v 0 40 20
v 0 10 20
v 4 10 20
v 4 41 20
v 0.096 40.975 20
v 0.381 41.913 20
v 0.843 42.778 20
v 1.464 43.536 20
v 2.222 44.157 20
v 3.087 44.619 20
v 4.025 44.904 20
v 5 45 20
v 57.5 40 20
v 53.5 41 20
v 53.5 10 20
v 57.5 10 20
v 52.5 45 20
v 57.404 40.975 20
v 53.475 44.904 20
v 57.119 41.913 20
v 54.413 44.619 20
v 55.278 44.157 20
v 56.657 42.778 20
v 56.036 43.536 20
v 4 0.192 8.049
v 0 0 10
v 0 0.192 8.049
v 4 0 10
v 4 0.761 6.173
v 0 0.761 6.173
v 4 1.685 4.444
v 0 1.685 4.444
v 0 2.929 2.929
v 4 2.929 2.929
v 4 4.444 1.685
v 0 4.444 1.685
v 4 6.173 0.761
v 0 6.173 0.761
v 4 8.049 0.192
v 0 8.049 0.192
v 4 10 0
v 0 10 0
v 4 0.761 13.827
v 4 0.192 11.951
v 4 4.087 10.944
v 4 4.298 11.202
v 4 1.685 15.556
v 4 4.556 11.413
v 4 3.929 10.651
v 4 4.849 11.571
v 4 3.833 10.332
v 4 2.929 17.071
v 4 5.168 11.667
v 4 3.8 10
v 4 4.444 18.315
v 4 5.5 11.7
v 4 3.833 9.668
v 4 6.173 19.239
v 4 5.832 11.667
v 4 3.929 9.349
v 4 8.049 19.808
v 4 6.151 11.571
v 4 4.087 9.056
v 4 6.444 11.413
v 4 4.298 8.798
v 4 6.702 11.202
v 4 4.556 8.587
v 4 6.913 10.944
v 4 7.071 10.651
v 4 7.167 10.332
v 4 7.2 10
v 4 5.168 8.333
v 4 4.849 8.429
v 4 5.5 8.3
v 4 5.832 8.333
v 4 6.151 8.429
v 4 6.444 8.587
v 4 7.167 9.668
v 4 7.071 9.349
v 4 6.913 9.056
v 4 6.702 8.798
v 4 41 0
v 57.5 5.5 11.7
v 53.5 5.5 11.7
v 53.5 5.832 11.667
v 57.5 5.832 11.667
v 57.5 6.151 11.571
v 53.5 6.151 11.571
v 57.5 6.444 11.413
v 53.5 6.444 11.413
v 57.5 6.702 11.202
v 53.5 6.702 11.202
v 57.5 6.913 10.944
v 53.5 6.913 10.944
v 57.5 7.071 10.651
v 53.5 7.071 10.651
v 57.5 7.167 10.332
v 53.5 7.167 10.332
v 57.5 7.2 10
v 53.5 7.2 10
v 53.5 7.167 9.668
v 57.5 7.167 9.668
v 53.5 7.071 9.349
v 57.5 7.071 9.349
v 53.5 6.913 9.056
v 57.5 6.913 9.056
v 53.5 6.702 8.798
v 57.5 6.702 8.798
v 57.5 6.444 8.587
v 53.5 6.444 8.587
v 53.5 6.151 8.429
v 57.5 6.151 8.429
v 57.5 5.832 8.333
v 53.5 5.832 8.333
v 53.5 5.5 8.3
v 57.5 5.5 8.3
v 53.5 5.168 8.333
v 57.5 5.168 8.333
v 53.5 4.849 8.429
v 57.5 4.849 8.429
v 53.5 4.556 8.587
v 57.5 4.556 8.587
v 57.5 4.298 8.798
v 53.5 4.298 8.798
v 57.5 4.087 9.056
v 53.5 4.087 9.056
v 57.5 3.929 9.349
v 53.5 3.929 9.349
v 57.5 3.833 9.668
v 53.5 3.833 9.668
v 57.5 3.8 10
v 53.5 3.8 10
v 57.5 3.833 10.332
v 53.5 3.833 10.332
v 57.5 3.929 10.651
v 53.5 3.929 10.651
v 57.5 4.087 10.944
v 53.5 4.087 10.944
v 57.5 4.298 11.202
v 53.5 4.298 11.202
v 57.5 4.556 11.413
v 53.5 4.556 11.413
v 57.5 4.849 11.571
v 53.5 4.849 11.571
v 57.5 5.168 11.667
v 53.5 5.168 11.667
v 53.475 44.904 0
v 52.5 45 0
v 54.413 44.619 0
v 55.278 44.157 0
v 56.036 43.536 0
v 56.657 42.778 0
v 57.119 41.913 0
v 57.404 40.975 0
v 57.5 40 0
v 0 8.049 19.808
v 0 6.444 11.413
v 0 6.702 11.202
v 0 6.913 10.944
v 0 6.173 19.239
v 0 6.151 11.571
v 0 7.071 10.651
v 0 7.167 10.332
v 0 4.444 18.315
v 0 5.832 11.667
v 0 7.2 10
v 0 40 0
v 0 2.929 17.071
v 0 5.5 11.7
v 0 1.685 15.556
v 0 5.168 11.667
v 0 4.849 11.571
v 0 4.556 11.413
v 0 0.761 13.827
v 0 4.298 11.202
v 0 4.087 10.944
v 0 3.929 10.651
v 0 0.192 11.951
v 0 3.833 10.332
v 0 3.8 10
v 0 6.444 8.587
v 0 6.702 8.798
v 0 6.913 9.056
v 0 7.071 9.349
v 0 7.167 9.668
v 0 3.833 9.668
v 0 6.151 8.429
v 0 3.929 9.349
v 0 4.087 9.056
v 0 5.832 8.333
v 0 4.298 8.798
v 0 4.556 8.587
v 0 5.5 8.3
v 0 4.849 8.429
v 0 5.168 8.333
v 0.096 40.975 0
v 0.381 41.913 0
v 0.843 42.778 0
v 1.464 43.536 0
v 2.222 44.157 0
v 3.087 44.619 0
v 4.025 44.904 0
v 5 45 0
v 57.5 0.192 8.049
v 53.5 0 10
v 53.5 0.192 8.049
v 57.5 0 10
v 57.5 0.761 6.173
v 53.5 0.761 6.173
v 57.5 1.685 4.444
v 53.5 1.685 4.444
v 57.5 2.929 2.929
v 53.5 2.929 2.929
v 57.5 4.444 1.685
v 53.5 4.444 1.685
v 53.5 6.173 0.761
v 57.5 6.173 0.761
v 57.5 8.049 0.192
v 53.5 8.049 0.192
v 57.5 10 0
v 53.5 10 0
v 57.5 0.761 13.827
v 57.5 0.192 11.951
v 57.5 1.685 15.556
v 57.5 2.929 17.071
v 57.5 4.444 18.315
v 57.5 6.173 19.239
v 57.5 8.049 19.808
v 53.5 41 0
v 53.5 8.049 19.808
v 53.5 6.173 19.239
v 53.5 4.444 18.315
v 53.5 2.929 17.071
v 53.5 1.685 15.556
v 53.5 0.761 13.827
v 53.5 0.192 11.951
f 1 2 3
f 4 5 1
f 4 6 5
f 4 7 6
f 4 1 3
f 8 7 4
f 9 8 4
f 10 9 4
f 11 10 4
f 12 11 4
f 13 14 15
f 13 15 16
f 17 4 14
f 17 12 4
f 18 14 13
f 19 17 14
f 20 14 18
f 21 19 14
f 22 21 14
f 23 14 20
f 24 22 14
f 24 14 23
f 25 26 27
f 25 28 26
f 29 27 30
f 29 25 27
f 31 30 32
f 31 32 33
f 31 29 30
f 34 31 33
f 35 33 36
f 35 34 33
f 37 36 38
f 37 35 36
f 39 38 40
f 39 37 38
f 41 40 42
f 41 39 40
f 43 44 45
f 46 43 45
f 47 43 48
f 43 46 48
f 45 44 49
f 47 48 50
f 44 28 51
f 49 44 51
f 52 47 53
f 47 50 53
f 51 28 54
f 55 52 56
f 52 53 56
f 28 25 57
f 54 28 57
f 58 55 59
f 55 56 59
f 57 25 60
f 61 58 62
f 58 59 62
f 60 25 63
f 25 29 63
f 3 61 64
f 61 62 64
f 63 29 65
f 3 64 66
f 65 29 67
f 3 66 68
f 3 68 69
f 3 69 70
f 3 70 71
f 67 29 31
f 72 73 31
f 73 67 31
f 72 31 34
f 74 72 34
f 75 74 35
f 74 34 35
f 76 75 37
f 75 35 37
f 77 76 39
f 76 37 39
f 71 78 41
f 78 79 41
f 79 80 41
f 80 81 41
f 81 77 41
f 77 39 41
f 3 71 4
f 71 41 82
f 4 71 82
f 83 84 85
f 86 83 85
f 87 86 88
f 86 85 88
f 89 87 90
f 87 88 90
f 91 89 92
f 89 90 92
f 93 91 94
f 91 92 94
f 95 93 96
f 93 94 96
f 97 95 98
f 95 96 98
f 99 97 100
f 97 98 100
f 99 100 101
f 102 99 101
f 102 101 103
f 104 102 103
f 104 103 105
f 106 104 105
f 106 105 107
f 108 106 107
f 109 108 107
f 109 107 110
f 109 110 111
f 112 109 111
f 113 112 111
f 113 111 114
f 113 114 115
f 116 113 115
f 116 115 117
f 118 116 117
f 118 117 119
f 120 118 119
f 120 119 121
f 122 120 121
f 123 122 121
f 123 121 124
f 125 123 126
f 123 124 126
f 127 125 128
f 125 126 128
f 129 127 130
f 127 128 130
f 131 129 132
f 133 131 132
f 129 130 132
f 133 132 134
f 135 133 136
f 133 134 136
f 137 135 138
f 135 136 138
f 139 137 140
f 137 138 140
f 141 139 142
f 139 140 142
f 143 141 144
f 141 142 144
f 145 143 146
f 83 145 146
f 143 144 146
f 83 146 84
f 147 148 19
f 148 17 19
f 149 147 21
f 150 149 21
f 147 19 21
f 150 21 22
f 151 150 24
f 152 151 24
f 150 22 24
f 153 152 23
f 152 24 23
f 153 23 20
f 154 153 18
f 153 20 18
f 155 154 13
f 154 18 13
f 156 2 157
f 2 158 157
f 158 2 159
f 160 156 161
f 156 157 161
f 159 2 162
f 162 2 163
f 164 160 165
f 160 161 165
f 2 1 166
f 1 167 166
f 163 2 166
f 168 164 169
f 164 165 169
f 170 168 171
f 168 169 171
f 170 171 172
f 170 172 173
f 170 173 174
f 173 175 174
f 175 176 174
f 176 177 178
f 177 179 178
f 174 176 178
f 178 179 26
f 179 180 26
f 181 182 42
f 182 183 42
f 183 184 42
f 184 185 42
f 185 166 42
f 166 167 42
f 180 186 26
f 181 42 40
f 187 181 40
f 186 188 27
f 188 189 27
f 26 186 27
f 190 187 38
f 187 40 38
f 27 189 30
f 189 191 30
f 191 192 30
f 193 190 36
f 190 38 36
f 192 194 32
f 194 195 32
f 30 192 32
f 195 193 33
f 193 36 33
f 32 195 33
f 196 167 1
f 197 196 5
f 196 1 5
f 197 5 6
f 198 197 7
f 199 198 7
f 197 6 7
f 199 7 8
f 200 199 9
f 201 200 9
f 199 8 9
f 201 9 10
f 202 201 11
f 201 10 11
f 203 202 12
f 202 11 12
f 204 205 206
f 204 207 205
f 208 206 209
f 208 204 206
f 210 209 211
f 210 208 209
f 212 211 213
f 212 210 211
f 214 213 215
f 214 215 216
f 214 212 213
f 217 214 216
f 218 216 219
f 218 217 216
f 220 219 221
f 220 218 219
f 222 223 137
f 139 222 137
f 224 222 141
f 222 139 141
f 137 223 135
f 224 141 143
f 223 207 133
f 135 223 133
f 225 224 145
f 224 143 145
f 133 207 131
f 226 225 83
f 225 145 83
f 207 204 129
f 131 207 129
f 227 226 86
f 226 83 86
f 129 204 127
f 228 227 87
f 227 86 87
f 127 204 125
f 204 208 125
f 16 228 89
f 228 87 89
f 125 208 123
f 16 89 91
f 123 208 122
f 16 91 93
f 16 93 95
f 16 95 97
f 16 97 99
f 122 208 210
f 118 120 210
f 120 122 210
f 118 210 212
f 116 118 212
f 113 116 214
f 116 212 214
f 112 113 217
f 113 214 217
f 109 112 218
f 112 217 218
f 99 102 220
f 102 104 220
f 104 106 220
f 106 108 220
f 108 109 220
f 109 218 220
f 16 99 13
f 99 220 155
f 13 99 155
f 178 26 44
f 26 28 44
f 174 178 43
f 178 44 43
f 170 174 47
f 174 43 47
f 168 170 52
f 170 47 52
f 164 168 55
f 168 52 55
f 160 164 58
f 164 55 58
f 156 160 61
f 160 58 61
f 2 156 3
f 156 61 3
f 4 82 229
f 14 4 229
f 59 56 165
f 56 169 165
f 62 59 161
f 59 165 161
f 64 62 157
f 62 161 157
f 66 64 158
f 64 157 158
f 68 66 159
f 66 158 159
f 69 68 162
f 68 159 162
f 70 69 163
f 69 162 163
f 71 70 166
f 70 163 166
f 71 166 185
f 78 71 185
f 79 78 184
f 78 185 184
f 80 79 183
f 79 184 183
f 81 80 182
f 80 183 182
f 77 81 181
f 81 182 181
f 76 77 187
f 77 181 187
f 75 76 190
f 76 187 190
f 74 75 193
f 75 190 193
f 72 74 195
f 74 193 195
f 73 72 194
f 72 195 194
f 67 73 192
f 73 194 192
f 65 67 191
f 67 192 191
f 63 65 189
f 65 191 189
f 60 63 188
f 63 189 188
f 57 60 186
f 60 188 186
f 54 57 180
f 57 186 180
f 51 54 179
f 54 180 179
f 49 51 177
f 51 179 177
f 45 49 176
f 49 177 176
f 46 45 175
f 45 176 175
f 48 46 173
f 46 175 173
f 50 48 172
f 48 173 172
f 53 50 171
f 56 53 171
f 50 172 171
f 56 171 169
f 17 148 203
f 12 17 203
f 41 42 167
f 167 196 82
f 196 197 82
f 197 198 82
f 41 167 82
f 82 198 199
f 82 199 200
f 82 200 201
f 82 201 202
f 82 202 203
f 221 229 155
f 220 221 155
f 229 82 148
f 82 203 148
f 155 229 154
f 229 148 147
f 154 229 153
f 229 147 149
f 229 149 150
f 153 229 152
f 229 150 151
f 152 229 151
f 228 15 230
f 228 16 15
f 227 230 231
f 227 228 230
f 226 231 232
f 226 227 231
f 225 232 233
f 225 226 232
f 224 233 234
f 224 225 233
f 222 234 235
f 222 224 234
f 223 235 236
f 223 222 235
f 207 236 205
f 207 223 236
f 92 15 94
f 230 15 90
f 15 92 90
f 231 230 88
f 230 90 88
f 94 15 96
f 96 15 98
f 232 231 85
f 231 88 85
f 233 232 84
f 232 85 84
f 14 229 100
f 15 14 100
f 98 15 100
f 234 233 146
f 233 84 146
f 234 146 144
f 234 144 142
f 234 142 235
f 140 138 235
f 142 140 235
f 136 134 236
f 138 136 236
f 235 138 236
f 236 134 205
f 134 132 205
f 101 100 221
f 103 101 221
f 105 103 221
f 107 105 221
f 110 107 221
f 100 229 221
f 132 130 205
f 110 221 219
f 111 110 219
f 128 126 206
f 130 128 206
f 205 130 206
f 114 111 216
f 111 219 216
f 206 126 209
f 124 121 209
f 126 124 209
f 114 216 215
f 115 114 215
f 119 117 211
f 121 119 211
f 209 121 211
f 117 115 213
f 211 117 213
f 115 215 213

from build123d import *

# Parameters (mm, degrees)
BOSS_EXTRU_1_DEPTH      = 20
ENL_V_MAT_EXTRU_1_REACH = 77.705
ESQUISSE2_R             = 1.5
D_GAGEMENT_M31_D        = 3.4
D_GAGEMENT_M31_DEPTH    = 57.5
D_GAGEMENT_M31_TIP      = 1.021463052
CONG_1_R                = 10
CONG_2_R                = 5


with BuildPart() as part:
    # Esquisse1 → Boss.-Extru.1 (new body)
    with BuildSketch(Plane.XY):
        Polygon((0, 0), (4, 0), (4, 41), (53.5, 41), (53.5, 0), (57.5, 0), (57.5, 45), (0, 45), align=None)
    extrude(amount=BOSS_EXTRU_1_DEPTH)

    # Enlèv. mat.-Extru.1: up to this face of the body (flat: up to its plane)
    enl_v_mat_extru_1_end = Plane(part.part.faces().sort_by_distance((0, 22.5, 10))[0])
    # Esquisse2 → Enlèv. mat.-Extru.1 (cut, up to the picked face)
    with BuildSketch(Plane(origin=(57.5, 0, 0), x_dir=(0, 0, -1), z_dir=(1, 0, 0)), mode=Mode.PRIVATE) as enl_v_mat_extru_1_sk1:
        with Locations((-10, 5.5)):
            Circle(ESQUISSE2_R)
    enl_v_mat_extru_1_tool1 = split(extrude(enl_v_mat_extru_1_sk1.sketch, amount=-ENL_V_MAT_EXTRU_1_REACH, mode=Mode.PRIVATE), bisect_by=enl_v_mat_extru_1_end, keep=Keep.BOTH, mode=Mode.PRIVATE)
    add(enl_v_mat_extru_1_tool1.solids().sort_by(Axis((57.5, 5.5, 10), (-1, 0, 0)))[0], mode=Mode.SUBTRACT)

    # Dégagement M31
    with Locations(Plane(origin=(57.5, 0, 0), x_dir=(0, 0, -1), z_dir=(1, 0, 0))):
        with Locations((-10, 5.5)):
            Hole(D_GAGEMENT_M31_D / 2, depth=D_GAGEMENT_M31_DEPTH)
            with Locations((0, 0, -(D_GAGEMENT_M31_DEPTH + D_GAGEMENT_M31_TIP / 2))):  # 118° drill point
                Cone(0, D_GAGEMENT_M31_D / 2, D_GAGEMENT_M31_TIP, mode=Mode.SUBTRACT)

    # Congé1
    cong_1_edges = [part.edges().sort_by_distance(p)[0] for p in [
        (55.5, 0, 0),
        (55.5, 0, 20),
        (2, 0, 0),
        (2, 0, 20),
    ]]
    fillet(cong_1_edges, radius=CONG_1_R - 0.0001)  # a hair under: the kernel refuses the full size

    # Congé2
    cong_2_edges = [part.edges().sort_by_distance(p)[0] for p in [
        (0, 45, 10),
        (57.5, 45, 10),
    ]]
    fillet(cong_2_edges, radius=CONG_2_R)


solid = part.part
